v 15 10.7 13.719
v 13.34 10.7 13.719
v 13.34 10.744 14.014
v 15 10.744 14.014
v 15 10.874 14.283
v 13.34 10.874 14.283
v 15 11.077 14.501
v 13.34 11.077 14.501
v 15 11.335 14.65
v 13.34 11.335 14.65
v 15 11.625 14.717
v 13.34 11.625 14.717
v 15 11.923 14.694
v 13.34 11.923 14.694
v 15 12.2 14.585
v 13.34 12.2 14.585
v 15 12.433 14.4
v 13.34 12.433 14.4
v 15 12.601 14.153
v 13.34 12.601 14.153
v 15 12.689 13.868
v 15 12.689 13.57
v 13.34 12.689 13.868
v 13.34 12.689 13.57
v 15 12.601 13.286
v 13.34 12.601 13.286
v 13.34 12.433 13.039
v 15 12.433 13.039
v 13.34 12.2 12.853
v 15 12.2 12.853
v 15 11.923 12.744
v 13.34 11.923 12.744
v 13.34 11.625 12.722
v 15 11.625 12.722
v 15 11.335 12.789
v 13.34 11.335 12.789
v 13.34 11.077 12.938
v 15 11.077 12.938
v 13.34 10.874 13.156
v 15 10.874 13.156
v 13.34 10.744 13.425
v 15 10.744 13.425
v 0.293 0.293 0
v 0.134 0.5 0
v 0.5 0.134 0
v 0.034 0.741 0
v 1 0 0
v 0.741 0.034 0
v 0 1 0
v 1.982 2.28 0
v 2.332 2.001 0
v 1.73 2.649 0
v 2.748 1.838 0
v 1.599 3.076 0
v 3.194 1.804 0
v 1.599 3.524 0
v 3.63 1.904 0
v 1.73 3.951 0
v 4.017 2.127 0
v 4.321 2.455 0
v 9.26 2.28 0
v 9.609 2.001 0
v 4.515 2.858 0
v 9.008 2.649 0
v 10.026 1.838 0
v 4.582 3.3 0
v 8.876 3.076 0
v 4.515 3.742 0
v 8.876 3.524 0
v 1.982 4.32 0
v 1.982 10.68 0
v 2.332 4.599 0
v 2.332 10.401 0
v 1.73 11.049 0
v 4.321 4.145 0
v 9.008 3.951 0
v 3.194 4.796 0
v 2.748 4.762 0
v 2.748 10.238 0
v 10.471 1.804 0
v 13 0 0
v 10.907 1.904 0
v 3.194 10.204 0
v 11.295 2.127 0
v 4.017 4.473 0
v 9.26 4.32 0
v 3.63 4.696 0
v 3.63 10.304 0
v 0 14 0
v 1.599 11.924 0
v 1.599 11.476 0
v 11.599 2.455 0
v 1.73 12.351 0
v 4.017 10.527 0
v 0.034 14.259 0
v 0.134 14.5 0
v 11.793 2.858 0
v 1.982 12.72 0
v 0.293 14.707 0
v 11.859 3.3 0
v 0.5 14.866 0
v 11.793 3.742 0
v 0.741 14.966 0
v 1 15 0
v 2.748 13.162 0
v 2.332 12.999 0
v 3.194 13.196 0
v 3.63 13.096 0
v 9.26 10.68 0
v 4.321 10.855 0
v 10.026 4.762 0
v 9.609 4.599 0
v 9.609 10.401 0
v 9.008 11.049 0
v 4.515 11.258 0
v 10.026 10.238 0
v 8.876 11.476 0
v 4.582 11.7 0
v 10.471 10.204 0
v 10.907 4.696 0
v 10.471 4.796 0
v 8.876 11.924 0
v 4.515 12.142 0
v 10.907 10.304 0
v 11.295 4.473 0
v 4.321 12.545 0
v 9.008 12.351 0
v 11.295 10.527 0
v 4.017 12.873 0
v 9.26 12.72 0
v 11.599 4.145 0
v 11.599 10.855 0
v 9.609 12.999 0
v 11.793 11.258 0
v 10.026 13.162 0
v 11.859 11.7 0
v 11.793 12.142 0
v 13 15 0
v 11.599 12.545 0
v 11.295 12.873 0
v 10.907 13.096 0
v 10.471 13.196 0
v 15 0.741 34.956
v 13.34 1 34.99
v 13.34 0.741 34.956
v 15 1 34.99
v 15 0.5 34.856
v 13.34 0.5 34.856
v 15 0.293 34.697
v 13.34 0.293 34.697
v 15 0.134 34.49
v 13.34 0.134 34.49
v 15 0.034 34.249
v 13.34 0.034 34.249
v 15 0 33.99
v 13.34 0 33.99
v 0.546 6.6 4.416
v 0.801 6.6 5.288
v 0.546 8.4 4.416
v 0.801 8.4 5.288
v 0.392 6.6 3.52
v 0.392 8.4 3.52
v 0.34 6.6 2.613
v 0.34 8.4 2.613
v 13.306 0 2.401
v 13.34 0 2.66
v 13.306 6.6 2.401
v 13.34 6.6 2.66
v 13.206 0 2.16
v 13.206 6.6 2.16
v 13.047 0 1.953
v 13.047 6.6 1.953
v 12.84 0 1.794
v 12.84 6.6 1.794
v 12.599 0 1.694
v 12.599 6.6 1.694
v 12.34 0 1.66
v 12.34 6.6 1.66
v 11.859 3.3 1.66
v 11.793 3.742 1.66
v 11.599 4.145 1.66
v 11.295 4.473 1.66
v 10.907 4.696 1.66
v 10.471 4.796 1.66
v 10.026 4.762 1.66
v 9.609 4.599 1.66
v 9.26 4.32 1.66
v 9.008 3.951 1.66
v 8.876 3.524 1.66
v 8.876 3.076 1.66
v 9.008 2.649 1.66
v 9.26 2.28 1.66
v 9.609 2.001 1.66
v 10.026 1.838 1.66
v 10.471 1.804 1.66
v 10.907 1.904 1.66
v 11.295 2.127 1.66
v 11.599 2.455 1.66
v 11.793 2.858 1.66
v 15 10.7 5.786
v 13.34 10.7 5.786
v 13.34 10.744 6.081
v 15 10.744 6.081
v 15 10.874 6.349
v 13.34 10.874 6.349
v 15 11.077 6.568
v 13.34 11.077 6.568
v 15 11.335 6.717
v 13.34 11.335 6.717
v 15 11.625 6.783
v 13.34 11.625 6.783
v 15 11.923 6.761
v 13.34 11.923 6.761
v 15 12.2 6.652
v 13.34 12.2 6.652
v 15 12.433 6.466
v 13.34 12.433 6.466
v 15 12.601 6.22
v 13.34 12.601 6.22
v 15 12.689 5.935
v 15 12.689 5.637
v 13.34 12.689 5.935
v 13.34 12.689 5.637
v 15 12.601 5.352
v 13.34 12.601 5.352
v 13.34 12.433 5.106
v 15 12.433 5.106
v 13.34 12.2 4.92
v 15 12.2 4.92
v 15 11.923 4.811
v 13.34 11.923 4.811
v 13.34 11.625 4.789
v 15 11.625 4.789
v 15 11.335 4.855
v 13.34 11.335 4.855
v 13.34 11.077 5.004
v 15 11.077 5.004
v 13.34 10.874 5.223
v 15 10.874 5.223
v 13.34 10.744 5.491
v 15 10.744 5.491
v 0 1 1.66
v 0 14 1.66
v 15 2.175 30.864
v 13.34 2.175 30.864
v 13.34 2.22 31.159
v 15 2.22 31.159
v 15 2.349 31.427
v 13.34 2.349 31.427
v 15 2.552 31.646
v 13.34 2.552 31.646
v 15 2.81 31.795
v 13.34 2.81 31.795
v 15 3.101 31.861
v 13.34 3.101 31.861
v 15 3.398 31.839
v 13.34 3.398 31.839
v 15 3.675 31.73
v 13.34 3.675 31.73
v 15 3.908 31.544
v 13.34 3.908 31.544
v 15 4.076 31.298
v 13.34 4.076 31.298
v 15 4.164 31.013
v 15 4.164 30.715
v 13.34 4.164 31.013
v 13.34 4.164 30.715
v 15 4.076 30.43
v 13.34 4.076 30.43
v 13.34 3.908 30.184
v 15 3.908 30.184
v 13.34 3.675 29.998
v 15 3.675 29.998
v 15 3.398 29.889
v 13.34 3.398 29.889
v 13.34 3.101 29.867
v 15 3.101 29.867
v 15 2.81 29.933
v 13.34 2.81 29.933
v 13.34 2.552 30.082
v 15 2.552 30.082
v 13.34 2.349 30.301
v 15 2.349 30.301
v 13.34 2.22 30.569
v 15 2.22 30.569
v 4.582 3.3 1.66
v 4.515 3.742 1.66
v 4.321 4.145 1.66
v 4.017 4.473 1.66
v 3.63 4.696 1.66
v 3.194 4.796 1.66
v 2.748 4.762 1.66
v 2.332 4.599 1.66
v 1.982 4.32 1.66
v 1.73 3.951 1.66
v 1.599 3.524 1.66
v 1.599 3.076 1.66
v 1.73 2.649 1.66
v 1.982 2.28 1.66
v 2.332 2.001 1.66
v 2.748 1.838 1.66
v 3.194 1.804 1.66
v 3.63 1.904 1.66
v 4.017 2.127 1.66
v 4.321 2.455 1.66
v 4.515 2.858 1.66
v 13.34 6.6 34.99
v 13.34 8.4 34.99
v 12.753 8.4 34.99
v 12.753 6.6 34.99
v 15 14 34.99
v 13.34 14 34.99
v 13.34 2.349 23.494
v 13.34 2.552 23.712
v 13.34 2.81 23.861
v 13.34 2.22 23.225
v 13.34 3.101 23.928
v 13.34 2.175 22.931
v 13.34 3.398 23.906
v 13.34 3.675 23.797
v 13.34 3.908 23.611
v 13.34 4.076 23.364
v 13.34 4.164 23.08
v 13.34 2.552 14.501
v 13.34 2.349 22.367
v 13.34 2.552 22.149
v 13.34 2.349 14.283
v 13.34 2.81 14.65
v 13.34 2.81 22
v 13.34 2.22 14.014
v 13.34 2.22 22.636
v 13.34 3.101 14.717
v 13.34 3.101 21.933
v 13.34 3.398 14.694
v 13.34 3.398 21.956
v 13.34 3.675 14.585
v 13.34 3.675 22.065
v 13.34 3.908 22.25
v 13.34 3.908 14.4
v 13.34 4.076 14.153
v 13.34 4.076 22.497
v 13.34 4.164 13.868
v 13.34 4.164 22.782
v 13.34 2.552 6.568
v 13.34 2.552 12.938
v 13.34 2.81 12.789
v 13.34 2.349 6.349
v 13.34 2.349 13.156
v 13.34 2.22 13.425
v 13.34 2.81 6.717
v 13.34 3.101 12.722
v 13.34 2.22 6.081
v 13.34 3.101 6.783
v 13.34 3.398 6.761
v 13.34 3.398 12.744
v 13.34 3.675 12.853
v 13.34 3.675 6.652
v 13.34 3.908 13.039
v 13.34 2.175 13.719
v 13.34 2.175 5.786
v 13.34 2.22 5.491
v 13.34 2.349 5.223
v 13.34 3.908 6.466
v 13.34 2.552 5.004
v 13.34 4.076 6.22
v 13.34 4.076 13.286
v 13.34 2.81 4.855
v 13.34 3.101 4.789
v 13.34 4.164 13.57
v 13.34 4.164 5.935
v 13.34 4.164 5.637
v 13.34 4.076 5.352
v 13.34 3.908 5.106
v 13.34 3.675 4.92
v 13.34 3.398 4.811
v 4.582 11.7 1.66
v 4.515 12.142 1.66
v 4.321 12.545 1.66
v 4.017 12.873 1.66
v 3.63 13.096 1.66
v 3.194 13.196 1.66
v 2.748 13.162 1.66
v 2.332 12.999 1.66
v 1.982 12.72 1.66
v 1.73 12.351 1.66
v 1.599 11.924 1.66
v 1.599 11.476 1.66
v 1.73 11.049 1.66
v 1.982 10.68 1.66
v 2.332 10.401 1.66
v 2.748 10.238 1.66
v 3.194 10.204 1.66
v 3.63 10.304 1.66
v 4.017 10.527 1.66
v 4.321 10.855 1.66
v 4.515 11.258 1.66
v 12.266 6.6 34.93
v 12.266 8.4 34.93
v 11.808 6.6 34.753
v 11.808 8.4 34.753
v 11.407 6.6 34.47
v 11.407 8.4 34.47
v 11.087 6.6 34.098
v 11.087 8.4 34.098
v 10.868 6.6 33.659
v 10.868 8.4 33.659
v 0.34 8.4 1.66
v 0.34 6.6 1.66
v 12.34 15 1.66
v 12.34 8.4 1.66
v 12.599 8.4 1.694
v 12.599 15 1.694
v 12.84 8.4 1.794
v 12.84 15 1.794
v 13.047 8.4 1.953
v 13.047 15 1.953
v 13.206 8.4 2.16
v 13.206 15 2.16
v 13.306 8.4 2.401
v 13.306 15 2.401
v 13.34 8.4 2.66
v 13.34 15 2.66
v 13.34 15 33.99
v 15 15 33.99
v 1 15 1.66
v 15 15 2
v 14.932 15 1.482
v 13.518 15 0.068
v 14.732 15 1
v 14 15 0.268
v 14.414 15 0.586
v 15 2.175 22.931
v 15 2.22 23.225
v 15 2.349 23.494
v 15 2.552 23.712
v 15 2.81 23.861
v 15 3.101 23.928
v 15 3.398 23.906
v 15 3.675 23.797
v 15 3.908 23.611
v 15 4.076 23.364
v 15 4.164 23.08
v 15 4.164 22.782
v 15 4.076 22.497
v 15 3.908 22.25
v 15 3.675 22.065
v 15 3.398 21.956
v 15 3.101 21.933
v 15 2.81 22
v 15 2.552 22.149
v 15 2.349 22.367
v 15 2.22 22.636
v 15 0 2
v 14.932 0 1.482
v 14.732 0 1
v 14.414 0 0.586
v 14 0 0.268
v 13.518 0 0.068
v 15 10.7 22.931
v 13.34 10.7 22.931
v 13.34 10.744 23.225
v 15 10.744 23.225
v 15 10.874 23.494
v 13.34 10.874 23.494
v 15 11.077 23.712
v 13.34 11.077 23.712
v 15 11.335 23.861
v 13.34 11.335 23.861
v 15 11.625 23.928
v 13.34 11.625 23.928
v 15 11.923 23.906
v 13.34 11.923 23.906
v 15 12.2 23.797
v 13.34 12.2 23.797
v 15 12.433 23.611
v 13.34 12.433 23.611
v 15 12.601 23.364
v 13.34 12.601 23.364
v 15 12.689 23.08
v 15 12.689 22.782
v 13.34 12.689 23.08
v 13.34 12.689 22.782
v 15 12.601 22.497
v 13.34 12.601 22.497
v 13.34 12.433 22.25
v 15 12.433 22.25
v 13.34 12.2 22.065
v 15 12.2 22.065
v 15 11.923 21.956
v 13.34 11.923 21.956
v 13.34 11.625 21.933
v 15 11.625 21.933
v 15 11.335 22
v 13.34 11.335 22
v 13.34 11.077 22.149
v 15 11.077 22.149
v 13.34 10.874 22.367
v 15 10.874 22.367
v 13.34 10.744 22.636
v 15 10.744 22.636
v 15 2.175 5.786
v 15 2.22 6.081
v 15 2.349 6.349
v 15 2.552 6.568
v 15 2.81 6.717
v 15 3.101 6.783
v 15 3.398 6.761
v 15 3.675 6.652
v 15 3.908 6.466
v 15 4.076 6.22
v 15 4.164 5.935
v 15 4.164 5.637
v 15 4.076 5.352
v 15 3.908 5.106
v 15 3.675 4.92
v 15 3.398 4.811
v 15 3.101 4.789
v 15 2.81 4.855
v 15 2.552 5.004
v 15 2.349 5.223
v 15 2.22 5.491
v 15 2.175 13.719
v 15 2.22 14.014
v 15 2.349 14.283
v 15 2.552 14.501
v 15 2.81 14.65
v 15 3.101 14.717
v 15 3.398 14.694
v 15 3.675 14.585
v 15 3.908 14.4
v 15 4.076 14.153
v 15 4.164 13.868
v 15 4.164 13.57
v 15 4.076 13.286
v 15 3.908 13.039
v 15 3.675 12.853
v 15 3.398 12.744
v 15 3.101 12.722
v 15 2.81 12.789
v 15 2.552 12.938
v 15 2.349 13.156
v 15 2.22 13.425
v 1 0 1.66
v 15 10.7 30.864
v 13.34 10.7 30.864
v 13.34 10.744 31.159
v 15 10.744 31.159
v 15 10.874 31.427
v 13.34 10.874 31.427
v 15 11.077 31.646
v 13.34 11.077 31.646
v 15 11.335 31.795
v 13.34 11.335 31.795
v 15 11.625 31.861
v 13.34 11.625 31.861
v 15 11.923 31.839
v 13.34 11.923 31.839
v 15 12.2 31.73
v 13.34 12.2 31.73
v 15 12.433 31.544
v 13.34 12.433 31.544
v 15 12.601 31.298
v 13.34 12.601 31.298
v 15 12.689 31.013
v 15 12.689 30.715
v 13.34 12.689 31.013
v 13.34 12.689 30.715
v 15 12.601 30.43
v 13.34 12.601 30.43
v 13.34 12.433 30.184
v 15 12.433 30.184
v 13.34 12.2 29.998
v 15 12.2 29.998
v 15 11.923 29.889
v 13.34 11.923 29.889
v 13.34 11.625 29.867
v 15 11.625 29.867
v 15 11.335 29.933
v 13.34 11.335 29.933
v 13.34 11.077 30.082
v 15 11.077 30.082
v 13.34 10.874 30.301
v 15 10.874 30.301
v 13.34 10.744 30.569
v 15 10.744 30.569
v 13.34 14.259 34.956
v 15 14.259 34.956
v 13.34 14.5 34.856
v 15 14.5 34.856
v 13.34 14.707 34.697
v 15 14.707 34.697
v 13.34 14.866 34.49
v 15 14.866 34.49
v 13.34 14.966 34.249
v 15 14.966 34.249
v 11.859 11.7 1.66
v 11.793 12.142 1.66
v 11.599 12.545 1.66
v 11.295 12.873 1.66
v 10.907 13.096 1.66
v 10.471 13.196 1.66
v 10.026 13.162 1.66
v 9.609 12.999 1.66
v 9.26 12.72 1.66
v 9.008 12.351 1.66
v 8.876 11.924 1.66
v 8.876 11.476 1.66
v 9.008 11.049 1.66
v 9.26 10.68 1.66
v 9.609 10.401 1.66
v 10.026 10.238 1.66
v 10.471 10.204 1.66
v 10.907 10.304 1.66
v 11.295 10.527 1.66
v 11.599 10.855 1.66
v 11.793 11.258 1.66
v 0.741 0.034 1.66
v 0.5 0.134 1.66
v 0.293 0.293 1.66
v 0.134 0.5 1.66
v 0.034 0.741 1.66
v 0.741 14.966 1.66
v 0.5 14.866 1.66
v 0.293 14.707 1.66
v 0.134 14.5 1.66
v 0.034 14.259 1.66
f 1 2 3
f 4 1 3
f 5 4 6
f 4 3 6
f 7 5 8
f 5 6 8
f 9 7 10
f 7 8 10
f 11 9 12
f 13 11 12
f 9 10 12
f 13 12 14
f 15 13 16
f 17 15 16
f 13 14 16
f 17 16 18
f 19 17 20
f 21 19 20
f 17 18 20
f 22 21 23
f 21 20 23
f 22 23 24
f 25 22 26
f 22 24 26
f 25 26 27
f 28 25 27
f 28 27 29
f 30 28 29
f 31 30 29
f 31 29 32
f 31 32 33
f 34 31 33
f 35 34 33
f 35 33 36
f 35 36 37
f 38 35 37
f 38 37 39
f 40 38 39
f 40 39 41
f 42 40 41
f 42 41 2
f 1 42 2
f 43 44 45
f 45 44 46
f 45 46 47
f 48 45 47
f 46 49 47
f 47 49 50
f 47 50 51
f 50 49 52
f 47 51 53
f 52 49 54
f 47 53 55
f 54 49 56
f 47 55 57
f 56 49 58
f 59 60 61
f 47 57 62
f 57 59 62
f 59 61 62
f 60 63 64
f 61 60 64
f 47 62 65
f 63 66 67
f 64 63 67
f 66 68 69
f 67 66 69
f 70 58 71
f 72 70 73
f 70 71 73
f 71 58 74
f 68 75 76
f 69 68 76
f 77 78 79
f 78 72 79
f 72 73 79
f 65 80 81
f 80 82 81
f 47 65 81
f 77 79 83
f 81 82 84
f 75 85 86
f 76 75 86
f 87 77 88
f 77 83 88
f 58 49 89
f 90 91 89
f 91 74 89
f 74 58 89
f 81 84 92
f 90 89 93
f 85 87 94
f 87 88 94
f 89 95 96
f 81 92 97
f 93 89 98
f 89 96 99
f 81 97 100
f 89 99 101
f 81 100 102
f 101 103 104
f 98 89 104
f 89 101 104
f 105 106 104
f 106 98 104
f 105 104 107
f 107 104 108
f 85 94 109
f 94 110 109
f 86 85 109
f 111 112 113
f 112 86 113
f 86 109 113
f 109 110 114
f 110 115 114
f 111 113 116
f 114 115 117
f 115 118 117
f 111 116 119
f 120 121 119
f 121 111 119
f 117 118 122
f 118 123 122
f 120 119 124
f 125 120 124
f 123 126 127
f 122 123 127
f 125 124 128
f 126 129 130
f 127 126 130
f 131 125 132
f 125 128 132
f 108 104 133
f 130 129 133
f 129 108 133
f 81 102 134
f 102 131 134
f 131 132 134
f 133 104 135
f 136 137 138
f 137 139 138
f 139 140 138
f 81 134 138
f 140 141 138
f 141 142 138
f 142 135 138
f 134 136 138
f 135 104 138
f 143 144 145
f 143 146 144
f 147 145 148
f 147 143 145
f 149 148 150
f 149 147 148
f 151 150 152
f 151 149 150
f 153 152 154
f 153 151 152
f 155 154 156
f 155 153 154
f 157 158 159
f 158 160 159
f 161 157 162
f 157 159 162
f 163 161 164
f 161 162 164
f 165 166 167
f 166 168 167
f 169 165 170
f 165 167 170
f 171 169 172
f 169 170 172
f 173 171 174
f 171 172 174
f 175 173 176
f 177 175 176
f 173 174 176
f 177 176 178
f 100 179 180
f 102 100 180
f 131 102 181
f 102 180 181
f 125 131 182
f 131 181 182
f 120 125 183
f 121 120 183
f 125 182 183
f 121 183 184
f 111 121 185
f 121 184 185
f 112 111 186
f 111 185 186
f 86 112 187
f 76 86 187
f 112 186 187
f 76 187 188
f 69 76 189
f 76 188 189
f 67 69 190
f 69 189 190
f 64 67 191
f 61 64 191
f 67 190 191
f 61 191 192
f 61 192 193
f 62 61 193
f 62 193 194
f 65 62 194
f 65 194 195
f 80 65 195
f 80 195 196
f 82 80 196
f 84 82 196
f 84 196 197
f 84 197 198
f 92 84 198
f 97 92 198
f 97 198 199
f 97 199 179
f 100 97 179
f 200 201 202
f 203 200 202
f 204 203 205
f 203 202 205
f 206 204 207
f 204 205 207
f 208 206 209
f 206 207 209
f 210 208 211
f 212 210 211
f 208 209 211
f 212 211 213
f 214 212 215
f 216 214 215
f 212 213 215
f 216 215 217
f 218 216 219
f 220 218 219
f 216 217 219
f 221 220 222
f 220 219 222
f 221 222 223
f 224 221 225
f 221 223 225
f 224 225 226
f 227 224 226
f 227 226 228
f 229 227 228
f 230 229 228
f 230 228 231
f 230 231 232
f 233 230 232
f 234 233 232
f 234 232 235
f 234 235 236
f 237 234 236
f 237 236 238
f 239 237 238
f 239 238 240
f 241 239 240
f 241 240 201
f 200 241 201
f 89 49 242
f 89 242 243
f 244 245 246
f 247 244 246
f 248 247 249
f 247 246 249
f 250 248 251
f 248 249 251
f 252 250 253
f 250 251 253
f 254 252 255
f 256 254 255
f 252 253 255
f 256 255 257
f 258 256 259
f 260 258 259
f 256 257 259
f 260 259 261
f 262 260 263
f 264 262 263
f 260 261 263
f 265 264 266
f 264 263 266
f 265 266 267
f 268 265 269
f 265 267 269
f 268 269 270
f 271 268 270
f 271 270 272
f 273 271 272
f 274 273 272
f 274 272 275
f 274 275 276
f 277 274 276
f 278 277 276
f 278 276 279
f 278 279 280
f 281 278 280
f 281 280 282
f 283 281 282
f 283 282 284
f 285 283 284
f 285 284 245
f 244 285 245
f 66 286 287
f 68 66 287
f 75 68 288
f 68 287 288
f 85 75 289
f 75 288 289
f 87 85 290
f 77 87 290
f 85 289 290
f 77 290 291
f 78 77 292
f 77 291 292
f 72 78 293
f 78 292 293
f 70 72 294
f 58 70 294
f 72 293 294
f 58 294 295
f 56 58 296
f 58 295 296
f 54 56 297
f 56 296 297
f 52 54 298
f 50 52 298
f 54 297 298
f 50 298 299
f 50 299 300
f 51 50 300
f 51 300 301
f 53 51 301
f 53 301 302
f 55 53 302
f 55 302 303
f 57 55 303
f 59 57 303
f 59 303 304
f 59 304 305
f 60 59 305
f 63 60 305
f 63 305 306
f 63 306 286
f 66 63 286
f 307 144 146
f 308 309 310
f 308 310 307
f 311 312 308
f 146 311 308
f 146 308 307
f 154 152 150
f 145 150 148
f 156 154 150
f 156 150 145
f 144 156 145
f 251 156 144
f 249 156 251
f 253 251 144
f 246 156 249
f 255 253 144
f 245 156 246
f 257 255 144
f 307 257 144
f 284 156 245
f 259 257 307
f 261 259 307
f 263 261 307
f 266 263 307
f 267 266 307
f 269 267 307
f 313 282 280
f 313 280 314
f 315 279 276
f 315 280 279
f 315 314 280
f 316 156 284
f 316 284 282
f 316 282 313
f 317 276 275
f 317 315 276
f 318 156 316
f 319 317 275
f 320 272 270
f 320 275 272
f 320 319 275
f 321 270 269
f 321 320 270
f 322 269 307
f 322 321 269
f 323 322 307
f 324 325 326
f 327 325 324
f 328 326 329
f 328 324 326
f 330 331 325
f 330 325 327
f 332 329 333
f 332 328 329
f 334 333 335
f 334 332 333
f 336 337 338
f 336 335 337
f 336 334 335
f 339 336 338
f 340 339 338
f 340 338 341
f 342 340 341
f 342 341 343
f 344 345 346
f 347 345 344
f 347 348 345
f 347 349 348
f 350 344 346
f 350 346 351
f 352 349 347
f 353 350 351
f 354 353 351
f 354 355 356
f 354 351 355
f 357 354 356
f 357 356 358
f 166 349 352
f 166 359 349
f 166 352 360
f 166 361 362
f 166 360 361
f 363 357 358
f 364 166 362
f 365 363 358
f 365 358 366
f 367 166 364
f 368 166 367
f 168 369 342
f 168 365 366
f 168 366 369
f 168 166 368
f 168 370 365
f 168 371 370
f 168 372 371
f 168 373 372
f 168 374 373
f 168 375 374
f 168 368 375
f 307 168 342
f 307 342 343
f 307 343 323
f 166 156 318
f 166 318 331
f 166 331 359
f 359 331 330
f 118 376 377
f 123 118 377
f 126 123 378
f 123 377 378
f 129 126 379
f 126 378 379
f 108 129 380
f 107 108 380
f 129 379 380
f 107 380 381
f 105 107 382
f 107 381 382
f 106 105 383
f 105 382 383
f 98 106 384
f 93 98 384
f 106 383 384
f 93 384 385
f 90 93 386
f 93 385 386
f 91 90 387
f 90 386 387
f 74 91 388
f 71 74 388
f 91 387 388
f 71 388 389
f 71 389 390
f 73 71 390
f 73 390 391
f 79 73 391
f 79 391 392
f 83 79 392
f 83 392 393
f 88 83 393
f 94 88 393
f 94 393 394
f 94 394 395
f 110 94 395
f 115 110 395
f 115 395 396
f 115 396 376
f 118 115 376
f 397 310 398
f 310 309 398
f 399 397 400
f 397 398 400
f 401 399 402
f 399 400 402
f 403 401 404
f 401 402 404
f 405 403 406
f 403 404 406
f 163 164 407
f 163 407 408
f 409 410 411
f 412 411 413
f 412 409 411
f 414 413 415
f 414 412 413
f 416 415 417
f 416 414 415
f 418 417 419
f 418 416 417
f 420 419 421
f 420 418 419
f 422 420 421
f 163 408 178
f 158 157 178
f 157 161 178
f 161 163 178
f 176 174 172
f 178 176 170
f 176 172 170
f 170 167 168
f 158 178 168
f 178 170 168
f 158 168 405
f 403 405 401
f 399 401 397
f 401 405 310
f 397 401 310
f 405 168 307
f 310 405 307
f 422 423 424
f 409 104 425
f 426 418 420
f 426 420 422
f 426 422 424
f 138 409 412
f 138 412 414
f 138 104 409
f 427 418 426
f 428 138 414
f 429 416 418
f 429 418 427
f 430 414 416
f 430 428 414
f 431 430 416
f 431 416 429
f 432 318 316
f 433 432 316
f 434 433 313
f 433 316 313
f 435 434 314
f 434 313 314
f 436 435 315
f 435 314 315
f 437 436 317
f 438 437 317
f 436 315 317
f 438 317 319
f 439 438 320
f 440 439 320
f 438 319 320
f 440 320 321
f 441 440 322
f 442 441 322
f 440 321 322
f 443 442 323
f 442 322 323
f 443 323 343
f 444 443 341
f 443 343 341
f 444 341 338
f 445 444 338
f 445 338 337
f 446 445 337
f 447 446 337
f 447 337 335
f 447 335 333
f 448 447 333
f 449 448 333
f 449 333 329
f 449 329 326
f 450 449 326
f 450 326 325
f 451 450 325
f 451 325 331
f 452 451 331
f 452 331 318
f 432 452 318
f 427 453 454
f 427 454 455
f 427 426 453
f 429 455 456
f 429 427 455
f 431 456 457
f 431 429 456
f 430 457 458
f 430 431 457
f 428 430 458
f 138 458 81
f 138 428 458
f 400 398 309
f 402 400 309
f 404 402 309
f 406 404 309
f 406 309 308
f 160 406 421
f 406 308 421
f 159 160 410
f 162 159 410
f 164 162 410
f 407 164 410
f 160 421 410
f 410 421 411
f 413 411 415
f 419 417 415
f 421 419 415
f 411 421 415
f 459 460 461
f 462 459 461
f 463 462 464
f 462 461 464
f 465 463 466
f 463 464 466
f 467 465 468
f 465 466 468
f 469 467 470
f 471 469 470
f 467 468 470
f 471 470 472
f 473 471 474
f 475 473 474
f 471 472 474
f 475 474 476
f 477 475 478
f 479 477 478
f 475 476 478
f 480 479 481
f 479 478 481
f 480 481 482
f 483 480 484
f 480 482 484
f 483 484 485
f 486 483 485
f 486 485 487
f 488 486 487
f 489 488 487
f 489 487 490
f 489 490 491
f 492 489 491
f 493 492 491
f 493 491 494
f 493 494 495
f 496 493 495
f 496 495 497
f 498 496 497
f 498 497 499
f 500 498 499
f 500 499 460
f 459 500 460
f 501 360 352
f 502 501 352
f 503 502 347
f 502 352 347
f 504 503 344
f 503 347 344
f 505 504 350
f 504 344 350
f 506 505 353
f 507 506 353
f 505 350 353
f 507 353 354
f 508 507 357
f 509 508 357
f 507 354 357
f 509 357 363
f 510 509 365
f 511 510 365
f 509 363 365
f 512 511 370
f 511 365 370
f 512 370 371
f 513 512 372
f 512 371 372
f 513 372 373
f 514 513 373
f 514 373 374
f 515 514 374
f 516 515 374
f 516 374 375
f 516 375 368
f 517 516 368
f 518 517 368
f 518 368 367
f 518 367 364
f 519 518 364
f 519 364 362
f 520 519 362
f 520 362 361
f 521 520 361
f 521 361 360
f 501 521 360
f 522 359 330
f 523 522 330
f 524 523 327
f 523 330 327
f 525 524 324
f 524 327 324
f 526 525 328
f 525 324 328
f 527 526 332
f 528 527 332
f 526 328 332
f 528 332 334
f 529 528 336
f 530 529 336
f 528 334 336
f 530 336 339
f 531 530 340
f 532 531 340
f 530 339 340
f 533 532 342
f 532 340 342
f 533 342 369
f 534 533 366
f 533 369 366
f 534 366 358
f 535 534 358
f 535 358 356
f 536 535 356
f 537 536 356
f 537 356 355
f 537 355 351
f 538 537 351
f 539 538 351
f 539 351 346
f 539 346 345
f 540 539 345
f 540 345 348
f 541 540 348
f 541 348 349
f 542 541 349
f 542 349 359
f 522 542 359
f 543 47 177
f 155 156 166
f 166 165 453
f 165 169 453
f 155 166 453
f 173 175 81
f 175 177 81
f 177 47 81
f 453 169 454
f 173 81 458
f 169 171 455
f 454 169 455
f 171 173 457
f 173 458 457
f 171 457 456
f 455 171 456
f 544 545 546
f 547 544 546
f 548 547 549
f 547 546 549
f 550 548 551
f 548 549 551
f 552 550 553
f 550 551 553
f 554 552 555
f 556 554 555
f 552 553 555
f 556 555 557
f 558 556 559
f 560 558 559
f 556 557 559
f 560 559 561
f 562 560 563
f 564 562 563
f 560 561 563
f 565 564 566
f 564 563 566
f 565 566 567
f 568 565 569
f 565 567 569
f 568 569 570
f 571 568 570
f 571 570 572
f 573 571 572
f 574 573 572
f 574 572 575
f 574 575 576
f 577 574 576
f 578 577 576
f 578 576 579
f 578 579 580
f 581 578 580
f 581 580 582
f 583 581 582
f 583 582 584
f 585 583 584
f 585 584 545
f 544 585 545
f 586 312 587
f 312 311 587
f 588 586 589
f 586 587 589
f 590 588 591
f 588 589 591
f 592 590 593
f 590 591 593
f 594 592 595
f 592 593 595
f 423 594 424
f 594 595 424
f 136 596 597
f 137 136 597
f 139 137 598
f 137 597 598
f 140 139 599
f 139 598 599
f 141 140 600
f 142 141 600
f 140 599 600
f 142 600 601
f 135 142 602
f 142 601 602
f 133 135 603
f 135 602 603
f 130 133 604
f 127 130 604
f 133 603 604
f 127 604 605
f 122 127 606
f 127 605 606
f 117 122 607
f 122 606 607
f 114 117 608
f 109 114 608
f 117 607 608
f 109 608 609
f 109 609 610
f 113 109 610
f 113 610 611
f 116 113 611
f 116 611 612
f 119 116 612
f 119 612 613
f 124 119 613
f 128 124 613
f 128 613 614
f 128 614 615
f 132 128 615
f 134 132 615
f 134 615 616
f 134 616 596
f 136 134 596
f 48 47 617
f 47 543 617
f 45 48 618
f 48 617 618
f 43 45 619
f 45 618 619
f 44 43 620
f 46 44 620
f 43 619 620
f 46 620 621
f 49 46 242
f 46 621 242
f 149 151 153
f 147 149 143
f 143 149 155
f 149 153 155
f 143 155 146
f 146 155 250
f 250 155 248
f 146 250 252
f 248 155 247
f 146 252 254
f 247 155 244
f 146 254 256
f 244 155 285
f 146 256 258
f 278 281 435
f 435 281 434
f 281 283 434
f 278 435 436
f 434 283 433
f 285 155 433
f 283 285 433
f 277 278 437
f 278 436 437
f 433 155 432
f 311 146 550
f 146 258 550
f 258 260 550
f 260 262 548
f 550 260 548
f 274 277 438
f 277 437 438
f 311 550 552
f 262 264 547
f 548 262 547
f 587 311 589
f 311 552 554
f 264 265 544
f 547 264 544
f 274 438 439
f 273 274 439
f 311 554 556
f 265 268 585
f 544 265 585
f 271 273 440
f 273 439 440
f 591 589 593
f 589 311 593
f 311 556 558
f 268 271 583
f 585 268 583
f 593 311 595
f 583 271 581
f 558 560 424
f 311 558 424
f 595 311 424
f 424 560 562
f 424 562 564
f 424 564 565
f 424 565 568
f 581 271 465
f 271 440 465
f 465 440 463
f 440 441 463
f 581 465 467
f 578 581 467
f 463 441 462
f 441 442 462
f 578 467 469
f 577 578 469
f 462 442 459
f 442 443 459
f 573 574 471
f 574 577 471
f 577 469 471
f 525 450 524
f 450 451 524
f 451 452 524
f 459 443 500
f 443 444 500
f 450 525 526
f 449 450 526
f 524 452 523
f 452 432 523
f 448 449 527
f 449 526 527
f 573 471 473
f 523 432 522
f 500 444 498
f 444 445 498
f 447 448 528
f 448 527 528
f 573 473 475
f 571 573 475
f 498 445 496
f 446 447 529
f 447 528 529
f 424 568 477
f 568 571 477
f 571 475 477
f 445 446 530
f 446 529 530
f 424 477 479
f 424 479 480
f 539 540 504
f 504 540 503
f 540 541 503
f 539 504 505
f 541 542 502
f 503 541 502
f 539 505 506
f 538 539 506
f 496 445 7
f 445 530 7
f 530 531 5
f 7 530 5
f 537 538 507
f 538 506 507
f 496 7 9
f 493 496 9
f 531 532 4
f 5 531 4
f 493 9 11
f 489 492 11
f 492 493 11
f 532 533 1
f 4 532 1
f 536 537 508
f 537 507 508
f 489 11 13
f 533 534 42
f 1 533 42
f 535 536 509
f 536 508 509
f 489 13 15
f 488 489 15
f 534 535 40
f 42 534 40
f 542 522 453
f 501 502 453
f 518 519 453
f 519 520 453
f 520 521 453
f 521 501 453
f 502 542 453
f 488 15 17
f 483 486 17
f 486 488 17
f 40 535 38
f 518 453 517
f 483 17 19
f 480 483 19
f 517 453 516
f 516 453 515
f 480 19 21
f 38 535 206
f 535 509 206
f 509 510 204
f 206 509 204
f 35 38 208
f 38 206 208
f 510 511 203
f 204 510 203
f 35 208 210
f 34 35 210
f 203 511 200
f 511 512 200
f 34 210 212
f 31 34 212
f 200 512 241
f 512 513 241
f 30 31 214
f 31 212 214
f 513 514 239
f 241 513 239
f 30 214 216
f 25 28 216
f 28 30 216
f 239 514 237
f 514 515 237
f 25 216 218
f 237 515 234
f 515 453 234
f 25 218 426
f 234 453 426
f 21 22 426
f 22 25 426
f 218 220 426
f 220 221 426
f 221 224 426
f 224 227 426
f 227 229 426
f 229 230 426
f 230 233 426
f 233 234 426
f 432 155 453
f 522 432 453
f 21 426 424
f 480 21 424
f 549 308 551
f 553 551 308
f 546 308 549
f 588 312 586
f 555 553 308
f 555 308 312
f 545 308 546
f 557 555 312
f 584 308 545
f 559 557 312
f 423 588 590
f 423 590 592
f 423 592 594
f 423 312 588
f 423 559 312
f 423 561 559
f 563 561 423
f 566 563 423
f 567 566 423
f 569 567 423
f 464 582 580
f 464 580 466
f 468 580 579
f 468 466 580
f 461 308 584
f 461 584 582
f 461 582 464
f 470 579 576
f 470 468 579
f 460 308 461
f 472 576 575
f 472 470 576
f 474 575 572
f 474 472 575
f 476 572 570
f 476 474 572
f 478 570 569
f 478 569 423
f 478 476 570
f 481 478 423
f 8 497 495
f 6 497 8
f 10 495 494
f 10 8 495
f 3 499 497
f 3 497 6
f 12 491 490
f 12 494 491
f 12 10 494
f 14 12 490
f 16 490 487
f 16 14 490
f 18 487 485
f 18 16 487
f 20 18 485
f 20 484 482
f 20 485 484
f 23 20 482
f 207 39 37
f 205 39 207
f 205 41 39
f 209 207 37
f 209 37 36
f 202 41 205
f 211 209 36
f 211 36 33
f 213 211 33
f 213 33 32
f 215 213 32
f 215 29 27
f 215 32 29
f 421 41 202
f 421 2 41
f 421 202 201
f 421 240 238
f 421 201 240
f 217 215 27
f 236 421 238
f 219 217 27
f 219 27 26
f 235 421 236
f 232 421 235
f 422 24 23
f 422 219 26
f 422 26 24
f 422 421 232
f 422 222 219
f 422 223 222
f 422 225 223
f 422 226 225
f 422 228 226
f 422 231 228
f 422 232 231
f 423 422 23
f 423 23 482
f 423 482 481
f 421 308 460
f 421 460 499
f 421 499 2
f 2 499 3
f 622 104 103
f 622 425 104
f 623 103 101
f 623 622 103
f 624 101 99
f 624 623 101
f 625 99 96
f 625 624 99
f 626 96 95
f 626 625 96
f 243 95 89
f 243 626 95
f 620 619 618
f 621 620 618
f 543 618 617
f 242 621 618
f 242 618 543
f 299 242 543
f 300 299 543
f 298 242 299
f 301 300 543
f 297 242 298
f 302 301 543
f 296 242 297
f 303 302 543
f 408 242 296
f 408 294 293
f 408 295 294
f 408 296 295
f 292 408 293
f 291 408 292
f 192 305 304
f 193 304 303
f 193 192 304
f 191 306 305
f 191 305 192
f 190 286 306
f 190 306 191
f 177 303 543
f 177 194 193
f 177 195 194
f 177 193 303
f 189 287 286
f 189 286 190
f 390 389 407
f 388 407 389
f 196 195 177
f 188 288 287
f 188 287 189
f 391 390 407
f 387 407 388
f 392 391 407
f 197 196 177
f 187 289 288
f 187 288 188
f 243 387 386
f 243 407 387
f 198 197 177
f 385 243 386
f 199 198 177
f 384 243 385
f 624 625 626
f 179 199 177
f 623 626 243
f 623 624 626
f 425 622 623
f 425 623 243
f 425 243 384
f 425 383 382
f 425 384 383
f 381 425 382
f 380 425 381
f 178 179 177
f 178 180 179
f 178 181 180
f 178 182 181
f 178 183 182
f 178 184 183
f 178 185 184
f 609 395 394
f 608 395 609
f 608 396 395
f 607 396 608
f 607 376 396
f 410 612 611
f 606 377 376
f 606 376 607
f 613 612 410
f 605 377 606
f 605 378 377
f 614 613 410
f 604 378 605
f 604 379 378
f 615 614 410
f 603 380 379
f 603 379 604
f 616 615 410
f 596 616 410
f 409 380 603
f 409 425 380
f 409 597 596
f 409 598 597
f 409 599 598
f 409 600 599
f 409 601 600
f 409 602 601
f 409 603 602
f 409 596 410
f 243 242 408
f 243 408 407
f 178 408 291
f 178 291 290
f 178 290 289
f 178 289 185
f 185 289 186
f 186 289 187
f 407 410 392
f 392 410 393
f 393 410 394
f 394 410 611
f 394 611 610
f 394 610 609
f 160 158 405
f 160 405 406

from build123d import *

# Parameters (mm, degrees)
F0_W           = 15
F0_H           = 15
F1_DEPTH       = 1.66
F2_W           = 1.66
F2_H           = 15
F3_DEPTH       = 33.33
F5_DEPTH       = 13
F6_SIZE2       = 31
F6_SIZE        = 11
F7_R           = 1
F8_R           = 2
F9_R           = 8
F10_R          = 1.5
F11_DEPTH      = 25
F12_R          = 1
F13_DEPTH      = 25
F13_DEPTH_BACK = 25


with BuildPart() as f1:
    # F0 (on Top) → F1 (new body)
    with BuildSketch(Plane.XY):
        with Locations((7.5, 7.5)):
            Rectangle(F0_W, F0_H)
    extrude(amount=F1_DEPTH)

    # F2 (on face) → F3 (join)
    with BuildSketch(Plane.XY.offset(1.66)):
        with Locations((14.17, 7.5)):
            Rectangle(F2_W, F2_H)
    extrude(amount=F3_DEPTH)

    # F4 (on face) → F5 (join)
    with BuildSketch(Plane(origin=(13.34, 0, 0), x_dir=(0, -1, 0), z_dir=(-1, 0, 0))):
        Polygon((-6.6, 34.99), (-7.5, 34.99), (-8.4, 34.99), (-8.4, 1.66), (-7.5, 1.66), (-6.6, 1.66), align=None)
    extrude(amount=F5_DEPTH)

    # F6
    f6_edges = [f1.edges().sort_by_distance(p)[0] for p in [
        (0.34, 7.5, 34.99),
    ]]
    f6_side = f1.faces().sort_by_distance((10.61882, 7.5, 34.99))[0]
    chamfer(f6_edges, length=F6_SIZE, length2=F6_SIZE2, reference=f6_side)

    # F7
    f7_edges = [f1.edges().sort_by_distance(p)[0] for p in [
        (0, 0, 0.83),
        (0, 15, 0.83),
        (13.34, 3.3, 1.66),
        (13.34, 11.7, 1.66),
        (14.17, 15, 34.99),
        (14.17, 0, 34.99),
    ]]
    fillet(f7_edges, radius=F7_R)

    # F8
    f8_edges = [f1.edges().sort_by_distance(p)[0] for p in [
        (11.34, 7.5, 34.99),
        (15, 7.5, 0),
    ]]
    fillet(f8_edges, radius=F8_R)

    # F9
    f9_edges = [f1.edges().sort_by_distance(p)[0] for p in [
        (0.34, 7.5, 3.99),
    ]]
    fillet(f9_edges, radius=F9_R)

    # F10 (on face) → F11 (cut)
    with BuildSketch(Plane.XY.offset(1.66)):
        with Locations((3.0819363892, 11.7)):
            Circle(F10_R)
        with Locations((10.3592835367, 11.7)):
            Circle(F10_R)
        with Locations((3.0819363892, 3.3)):
            Circle(F10_R)
        with Locations((10.3592835367, 3.3)):
            Circle(F10_R)
    extrude(amount=-F11_DEPTH, mode=Mode.SUBTRACT)

    # F12 (on face) → F13 (cut, two sides)
    with BuildSketch(Plane(origin=(13.34, 0, 0), x_dir=(0, -1, 0), z_dir=(-1, 0, 0))) as f13_sk:
        with Locations((-11.7, 22.9306016117)):
            Circle(F12_R)
        with Locations((-11.7, 30.8641027659)):
            Circle(F12_R)
        with Locations((-11.7, 13.7193983883)):
            Circle(F12_R)
        with Locations((-11.7, 5.7858972341)):
            Circle(F12_R)
        with Locations((-3.1753151298, 30.8641027659)):
            Circle(F12_R)
        with Locations((-3.1753151298, 22.9306016117)):
            Circle(F12_R)
        with Locations((-3.1753151298, 13.7193983883)):
            Circle(F12_R)
        with Locations((-3.1753151298, 5.7858972341)):
            Circle(F12_R)
    extrude(amount=F13_DEPTH, mode=Mode.SUBTRACT)
    extrude(f13_sk.sketch, amount=-F13_DEPTH_BACK, mode=Mode.SUBTRACT)


solid = f1.part
